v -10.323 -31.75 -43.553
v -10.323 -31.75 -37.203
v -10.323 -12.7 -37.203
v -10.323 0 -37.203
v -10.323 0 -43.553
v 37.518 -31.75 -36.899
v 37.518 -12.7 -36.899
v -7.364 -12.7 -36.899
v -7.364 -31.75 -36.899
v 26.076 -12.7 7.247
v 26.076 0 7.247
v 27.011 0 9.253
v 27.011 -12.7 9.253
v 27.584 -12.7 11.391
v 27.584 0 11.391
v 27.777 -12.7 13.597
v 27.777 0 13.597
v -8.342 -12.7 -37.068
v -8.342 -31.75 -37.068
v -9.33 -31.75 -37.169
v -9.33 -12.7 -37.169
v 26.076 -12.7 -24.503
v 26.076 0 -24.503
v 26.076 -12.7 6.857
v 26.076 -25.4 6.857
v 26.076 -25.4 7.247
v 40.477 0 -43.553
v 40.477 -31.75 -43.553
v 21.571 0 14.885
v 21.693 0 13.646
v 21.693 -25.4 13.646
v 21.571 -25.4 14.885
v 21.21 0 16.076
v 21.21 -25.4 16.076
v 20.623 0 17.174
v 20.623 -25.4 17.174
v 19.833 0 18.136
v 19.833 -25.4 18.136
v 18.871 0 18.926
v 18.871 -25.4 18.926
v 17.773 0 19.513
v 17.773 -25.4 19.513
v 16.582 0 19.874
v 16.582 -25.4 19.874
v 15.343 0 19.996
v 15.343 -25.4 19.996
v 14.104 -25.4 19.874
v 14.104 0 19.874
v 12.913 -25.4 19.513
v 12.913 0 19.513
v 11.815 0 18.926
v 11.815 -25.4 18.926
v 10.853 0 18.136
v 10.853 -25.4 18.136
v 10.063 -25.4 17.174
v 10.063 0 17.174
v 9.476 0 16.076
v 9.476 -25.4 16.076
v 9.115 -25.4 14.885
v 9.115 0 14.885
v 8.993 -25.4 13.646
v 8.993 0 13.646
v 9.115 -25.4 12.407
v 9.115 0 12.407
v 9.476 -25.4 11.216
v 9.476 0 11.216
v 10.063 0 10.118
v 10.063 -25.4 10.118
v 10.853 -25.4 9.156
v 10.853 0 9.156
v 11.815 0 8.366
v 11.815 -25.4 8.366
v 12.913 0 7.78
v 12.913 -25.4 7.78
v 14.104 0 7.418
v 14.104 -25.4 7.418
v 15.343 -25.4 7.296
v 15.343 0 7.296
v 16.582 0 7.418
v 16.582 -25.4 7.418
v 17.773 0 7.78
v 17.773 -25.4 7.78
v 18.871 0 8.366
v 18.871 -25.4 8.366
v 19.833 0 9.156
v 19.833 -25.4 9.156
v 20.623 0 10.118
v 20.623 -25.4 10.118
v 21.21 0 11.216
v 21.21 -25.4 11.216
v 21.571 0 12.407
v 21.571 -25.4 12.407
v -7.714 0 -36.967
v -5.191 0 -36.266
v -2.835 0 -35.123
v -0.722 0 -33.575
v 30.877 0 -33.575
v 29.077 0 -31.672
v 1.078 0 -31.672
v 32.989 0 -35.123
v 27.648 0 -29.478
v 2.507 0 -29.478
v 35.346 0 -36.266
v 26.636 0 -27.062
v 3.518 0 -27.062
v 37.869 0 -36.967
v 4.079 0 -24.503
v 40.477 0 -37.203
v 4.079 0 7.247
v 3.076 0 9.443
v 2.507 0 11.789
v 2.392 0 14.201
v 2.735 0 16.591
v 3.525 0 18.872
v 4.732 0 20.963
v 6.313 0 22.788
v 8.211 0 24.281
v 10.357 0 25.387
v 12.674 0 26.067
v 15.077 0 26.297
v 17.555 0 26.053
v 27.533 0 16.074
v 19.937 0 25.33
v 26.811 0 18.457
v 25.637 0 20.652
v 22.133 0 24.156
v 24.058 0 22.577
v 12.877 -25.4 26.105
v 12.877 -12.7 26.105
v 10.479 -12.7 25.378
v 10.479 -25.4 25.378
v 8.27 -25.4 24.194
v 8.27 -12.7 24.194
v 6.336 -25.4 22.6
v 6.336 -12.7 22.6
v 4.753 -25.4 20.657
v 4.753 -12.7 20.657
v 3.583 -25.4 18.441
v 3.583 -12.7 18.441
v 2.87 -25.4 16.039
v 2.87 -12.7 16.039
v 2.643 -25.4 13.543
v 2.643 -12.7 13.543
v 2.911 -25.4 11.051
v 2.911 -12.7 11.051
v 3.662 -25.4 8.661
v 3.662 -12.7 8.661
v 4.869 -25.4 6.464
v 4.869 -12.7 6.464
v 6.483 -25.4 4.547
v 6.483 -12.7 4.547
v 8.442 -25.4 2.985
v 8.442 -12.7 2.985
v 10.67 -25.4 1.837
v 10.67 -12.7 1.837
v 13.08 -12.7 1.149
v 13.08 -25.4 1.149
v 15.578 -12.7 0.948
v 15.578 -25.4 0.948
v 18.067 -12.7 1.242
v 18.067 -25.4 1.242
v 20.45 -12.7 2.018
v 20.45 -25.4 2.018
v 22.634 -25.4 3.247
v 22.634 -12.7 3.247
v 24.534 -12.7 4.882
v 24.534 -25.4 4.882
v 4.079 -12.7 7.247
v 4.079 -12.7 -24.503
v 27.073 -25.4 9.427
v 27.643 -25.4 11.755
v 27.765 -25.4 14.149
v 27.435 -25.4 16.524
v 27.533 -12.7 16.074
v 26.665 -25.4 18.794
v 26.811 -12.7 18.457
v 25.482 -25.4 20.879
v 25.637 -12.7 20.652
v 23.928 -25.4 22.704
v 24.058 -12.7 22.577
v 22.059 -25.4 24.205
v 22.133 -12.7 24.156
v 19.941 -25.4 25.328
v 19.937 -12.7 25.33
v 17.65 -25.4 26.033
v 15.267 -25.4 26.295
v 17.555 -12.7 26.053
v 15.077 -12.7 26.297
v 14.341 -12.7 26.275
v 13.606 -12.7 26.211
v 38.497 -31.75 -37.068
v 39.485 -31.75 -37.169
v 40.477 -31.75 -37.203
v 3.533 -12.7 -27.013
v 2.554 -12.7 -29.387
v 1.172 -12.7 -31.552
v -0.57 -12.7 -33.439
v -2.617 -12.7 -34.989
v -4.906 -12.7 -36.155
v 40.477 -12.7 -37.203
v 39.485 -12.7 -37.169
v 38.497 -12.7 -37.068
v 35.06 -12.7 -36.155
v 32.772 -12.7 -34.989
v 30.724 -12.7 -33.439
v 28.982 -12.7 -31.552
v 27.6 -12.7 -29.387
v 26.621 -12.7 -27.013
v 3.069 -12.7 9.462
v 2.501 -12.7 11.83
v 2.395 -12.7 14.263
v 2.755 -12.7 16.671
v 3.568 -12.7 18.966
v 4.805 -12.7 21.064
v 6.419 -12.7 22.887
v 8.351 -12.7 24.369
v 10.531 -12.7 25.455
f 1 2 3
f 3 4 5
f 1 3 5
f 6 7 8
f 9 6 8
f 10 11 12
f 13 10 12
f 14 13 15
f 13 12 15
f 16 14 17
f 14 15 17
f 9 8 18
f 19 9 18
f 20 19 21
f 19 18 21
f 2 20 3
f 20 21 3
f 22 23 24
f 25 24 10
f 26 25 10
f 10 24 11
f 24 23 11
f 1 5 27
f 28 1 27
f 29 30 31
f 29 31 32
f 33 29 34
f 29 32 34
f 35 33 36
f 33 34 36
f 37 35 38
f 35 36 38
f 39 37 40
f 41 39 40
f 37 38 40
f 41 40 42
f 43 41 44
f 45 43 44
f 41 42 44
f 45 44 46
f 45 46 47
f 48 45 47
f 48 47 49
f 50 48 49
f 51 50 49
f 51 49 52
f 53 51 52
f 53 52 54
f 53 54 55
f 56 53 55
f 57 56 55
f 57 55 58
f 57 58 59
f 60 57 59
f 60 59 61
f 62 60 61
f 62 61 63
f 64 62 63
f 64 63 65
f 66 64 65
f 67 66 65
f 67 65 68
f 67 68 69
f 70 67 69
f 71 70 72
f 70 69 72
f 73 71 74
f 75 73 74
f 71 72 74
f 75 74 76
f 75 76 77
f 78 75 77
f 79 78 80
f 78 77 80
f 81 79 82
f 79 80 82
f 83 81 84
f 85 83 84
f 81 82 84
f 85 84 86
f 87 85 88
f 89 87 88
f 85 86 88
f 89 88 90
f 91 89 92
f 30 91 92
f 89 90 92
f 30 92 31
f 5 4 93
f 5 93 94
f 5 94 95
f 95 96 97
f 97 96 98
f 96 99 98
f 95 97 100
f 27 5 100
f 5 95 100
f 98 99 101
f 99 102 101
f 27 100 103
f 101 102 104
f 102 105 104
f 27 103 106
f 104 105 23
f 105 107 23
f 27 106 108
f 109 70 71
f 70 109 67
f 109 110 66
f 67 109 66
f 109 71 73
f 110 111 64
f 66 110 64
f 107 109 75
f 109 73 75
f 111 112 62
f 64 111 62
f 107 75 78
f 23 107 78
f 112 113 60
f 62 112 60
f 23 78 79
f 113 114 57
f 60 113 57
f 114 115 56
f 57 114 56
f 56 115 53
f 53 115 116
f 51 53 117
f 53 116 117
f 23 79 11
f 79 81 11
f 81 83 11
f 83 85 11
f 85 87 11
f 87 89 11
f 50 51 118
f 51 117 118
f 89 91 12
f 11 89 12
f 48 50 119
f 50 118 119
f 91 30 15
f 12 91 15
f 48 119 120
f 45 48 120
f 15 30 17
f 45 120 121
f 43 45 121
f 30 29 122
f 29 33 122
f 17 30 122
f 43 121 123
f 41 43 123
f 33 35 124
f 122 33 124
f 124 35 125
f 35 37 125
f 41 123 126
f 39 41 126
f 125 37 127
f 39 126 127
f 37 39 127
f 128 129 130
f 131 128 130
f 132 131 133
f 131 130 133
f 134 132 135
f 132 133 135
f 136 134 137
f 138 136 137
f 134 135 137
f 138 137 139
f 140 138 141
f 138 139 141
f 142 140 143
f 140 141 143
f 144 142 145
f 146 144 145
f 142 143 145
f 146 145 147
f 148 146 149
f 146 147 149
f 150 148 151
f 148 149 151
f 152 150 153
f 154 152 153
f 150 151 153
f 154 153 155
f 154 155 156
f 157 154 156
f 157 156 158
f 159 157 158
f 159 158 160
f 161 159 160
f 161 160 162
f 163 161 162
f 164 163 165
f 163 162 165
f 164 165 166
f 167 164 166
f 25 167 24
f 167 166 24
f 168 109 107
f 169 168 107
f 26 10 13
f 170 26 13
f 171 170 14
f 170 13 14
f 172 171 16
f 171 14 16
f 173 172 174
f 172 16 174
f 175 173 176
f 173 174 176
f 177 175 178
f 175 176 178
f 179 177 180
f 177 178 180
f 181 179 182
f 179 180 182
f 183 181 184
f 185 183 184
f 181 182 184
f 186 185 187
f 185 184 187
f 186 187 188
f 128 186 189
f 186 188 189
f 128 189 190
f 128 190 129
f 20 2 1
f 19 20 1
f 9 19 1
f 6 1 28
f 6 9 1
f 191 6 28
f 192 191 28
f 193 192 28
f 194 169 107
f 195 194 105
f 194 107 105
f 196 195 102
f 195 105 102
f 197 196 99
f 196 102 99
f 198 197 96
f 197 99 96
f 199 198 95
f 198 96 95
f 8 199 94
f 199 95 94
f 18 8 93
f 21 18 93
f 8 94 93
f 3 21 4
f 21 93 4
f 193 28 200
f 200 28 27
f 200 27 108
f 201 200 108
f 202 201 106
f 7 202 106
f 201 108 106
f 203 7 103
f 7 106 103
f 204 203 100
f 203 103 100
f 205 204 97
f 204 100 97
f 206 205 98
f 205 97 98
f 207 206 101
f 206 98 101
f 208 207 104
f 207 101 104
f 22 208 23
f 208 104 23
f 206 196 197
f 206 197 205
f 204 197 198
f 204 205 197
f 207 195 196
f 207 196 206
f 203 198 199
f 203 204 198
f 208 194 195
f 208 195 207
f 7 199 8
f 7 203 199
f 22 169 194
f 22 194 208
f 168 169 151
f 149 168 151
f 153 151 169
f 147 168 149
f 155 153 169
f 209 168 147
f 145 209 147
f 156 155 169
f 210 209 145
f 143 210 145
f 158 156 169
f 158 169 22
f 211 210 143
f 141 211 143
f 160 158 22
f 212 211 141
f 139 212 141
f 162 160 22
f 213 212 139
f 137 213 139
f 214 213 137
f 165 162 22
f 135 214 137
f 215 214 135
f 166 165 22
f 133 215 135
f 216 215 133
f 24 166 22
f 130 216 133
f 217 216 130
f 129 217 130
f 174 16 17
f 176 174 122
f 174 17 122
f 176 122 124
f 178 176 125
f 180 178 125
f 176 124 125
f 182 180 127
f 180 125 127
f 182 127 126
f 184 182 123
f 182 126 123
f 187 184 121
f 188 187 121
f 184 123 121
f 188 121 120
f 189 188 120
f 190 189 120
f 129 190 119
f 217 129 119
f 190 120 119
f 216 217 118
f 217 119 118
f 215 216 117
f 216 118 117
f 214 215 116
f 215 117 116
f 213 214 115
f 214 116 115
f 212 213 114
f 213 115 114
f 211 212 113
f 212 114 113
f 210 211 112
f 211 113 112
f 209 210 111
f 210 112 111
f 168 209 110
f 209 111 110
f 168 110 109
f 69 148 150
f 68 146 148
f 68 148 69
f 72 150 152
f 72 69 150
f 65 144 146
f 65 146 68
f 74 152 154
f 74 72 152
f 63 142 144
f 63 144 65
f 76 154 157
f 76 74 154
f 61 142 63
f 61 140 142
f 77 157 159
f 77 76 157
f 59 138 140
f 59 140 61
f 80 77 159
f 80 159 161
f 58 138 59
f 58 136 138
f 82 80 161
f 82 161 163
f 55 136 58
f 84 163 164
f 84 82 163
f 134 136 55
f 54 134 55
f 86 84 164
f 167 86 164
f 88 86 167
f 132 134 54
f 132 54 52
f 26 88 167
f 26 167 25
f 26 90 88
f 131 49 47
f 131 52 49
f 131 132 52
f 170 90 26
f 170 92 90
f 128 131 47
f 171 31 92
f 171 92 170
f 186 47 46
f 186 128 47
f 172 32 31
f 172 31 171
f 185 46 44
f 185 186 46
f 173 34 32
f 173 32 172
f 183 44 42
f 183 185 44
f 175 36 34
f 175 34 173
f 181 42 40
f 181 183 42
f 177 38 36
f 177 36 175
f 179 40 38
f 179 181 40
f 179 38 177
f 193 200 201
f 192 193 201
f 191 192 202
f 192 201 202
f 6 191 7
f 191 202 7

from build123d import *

# Parameters (mm, degrees)
F1_DEPTH = 12.7
F4_DEPTH = 19.05
F6_DEPTH = 12.7
F7_R     = 6.35
F8_DEPTH = 110.49


with BuildPart() as f1:
    # F0 (on Front) → F1 (new body)
    with BuildSketch(Plane.XZ):
        with BuildLine():
            ThreePointArc((27.7772603229, 13.5966521085), (24.0575164439, 22.5769082296), (15.0772603229, 26.2966521085))
            ThreePointArc((15.0772603229, 26.2966521085), (4.0787376948, 19.9466521085), (4.0787376948, 7.2466521085))
            ThreePointArc((4.0787376948, 7.2466521085), (15.0772603229, 0.8966521085), (26.0757829509, 7.2466521085))
            ThreePointArc((26.0757829509, 7.2466521085), (27.3445183167, 10.3096502357), (27.7772603229, 13.5966521085))
        make_face()
        with BuildLine():
            Line((4.0787376948, -24.5033478915), (4.0787376948, -37.2033478915))
            Line((4.0787376948, -37.2033478915), (26.0757829509, -37.2033478915))
            Line((26.0757829509, -37.2033478915), (26.0757829509, -24.5033478915))
            Line((26.0757829509, -24.5033478915), (26.0757829509, 7.2466521085))
            ThreePointArc((26.0757829509, 7.2466521085), (15.0772603229, 0.8966521085), (4.0787376948, 7.2466521085))
            Line((4.0787376948, 7.2466521085), (4.0787376948, -24.5033478915))
        make_face()
        with BuildLine():
            Line((26.0757829509, -24.5033478915), (26.0757829509, -37.2033478915))
            Line((26.0757829509, -37.2033478915), (40.4772603229, -37.2033478915))
            ThreePointArc((40.4772603229, -37.2033478915), (30.876576096, -33.5748251672), (26.0757829509, -24.5033478915))
        make_face()
        with BuildLine():
            ThreePointArc((4.0787376948, -24.5033478915), (-0.7220554503, -33.5748251672), (-10.3227396771, -37.2033478915))
            Line((-10.3227396771, -37.2033478915), (4.0787376948, -37.2033478915))
            Line((4.0787376948, -37.2033478915), (4.0787376948, -24.5033478915))
        make_face()
        Polygon((4.0787376948, -37.2033478915), (-10.3227396771, -37.2033478915), (-10.3227396771, -43.5533478915), (40.4772603229, -43.5533478915), (40.4772603229, -37.2033478915), (26.0757829509, -37.2033478915), align=None)
    extrude(amount=F1_DEPTH)

    # F3 (on face) → F4 (join)
    with BuildSketch(Plane.XZ.offset(12.7)):
        with BuildLine():
            ThreePointArc((40.4772603229, -37.2033478915), (38.989932999, -37.1269472667), (37.5182624684, -36.8985496461))
            Line((37.5182624684, -36.8985496461), (-7.3637418227, -36.8985496461))
            ThreePointArc((-7.3637418227, -36.8985496461), (-8.8354123533, -37.1269472667), (-10.3227396771, -37.2033478915))
            Line((-10.3227396771, -37.2033478915), (-10.3227396771, -43.5533478915))
            Line((-10.3227396771, -43.5533478915), (40.4772603229, -43.5533478915))
            Line((40.4772603229, -43.5533478915), (40.4772603229, -37.2033478915))
        make_face()
    extrude(amount=F4_DEPTH)

    # F5 (on face) → F6 (join)
    with BuildSketch(Plane.XZ.offset(12.7)):
        with BuildLine():
            ThreePointArc((26.0757829509, 7.2466521085), (25.482031486, 20.8788727205), (12.8772183881, 26.1046421743))
            ThreePointArc((12.8772183881, 26.1046421743), (4.8688817883, 6.4640315912), (26.0757829509, 6.8569466568))
            Line((26.0757829509, 6.8569466568), (26.0757829509, 7.2466521085))
        make_face()
    extrude(amount=F6_DEPTH)

    # F7 (on face) → F8 (cut)
    with BuildSketch(Plane.XZ.offset(25.4)):
        with Locations((15.3429014608, 13.6462952942)):
            Circle(F7_R)
    extrude(amount=-F8_DEPTH, mode=Mode.SUBTRACT)


solid = f1.part
